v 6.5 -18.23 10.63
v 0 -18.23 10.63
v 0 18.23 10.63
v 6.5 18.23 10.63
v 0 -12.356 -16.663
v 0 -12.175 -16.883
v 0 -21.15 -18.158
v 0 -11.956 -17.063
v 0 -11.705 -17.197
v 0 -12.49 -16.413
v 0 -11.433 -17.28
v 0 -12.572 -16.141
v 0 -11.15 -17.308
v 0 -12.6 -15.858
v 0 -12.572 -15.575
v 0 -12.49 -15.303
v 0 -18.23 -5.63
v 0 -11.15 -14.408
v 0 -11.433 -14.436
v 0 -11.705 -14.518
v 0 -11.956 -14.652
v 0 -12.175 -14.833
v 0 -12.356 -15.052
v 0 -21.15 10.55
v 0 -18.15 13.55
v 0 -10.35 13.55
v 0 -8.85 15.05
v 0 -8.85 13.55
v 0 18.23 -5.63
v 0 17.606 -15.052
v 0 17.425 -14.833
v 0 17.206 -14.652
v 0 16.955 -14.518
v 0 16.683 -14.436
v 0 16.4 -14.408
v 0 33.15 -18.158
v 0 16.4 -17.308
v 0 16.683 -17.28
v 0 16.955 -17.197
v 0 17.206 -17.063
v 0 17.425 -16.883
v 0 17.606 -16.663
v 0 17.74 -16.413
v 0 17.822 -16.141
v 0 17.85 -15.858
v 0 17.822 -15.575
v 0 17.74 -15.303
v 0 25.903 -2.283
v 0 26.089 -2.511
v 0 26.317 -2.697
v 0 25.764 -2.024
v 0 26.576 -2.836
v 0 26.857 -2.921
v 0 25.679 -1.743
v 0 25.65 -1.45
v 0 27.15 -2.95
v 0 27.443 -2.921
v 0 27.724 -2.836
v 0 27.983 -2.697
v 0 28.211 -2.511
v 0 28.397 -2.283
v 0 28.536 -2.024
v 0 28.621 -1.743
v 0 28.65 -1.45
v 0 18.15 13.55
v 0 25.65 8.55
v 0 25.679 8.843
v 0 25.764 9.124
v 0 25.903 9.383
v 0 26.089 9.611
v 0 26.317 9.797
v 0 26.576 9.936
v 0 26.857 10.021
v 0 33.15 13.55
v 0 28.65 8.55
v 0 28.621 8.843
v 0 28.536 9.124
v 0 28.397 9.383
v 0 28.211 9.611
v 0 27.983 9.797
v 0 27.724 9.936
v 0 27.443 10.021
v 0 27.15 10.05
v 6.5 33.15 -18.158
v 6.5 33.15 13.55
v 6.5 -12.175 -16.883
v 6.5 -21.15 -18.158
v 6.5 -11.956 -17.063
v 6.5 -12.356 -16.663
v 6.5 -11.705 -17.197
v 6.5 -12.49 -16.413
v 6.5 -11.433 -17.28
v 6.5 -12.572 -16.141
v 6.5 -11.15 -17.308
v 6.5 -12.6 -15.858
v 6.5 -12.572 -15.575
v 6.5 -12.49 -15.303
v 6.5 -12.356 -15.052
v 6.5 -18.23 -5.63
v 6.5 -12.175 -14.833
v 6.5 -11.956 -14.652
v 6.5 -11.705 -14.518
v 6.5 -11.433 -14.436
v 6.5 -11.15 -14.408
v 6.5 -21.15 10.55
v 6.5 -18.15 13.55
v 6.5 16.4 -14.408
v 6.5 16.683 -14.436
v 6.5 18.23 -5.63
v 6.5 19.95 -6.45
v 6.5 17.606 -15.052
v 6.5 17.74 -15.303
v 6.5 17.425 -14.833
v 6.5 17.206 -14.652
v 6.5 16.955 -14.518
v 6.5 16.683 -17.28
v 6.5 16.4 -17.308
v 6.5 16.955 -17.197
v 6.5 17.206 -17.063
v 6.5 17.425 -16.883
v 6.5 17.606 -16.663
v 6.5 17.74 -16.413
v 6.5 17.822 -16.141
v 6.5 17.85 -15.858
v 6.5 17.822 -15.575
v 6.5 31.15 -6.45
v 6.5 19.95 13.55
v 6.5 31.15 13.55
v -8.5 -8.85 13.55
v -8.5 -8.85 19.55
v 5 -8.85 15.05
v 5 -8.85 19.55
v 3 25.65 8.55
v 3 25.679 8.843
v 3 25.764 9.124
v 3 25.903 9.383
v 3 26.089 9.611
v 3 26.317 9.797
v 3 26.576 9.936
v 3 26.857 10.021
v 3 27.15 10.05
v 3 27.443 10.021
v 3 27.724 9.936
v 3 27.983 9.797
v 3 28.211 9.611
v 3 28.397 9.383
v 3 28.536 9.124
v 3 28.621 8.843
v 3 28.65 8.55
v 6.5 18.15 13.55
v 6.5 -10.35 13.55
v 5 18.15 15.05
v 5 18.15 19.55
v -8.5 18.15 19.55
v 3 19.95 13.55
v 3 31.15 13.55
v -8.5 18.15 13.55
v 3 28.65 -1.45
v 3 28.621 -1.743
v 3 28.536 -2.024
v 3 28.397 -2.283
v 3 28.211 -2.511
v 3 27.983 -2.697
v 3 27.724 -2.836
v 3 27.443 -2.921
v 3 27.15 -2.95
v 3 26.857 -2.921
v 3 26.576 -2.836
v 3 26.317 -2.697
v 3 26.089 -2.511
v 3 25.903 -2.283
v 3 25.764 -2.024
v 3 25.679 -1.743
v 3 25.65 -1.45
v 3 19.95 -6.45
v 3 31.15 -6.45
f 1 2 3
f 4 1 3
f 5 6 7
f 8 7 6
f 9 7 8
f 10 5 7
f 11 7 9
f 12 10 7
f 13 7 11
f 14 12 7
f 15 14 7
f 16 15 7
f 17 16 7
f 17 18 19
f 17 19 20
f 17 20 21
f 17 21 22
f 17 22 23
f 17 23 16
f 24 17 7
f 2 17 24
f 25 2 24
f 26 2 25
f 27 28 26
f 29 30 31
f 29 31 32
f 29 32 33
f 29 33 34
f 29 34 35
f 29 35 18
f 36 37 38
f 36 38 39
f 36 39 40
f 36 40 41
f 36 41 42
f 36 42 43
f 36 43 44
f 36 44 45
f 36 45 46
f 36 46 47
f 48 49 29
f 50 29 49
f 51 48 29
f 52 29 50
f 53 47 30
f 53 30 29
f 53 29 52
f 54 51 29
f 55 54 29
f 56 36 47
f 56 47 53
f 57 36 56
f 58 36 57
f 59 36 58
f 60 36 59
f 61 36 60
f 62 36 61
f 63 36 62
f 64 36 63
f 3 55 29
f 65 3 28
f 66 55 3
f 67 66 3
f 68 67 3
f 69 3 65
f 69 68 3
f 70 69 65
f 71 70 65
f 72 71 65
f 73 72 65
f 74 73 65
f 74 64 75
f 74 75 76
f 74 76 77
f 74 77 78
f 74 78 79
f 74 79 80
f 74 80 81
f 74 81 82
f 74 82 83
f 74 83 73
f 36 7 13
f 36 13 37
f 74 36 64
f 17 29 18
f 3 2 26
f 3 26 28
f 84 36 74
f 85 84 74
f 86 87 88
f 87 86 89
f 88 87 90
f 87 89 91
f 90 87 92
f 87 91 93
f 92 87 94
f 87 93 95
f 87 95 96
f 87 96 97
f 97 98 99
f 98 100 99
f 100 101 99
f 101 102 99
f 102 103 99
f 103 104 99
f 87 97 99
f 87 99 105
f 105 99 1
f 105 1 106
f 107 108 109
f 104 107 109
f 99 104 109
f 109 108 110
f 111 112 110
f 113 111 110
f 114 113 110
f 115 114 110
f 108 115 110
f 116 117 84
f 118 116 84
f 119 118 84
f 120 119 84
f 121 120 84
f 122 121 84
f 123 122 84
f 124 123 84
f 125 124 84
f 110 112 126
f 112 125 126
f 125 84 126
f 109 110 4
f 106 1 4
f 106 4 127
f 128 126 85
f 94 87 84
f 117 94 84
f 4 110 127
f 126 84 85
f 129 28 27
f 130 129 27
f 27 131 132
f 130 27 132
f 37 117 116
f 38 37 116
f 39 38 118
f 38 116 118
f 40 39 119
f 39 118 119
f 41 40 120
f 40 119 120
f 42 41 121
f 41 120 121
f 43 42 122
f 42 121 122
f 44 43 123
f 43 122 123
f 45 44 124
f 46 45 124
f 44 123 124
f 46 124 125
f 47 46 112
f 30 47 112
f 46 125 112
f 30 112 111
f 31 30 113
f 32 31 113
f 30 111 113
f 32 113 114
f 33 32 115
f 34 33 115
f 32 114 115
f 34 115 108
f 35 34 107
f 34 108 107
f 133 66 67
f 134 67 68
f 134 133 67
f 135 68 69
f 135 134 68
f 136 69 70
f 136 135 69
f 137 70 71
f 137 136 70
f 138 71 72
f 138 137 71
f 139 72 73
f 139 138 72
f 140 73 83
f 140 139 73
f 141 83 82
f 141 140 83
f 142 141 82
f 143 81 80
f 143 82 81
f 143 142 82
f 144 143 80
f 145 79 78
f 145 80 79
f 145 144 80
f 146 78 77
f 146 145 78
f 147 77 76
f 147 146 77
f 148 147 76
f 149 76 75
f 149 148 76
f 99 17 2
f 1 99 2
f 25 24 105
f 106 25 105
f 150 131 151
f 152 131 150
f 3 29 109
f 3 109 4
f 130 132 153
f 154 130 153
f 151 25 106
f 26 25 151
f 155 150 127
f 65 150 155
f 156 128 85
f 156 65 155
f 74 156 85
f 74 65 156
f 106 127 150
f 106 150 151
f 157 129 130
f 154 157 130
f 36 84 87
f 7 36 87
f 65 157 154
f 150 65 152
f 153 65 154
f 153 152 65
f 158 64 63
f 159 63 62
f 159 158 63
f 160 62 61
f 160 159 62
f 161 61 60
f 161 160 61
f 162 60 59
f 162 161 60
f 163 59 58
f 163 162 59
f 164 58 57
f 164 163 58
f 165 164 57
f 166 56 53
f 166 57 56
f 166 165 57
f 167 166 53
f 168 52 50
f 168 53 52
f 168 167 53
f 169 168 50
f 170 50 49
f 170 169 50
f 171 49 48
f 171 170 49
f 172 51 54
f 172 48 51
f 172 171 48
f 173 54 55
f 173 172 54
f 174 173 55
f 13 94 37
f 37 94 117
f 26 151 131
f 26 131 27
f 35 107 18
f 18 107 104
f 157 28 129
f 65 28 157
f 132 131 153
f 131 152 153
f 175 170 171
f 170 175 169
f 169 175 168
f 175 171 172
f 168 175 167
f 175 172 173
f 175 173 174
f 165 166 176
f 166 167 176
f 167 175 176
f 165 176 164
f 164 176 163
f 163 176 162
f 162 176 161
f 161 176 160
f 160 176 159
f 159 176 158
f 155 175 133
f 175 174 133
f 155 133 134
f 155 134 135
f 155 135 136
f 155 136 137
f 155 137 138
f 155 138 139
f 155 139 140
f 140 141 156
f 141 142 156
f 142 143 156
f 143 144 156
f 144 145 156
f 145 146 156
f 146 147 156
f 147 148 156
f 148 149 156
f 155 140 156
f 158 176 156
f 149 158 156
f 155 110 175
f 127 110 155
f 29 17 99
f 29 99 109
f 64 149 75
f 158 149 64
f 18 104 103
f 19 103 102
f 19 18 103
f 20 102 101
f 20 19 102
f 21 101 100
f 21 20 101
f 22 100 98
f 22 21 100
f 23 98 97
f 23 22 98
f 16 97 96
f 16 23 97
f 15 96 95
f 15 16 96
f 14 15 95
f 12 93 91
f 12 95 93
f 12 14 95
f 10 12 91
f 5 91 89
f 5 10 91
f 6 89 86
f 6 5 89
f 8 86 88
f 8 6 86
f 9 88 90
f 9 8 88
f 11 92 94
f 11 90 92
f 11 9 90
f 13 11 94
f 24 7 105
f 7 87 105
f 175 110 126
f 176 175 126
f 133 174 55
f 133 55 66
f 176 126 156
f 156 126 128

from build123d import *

# Parameters (mm, degrees)
SKETCH_1_W               = 27.1
SKETCH_1_H               = 42.3
SKETCH_1_W_2             = 21.1
SKETCH_1_H_2             = 36.3
EXTRUDE_1_DEPTH          = 6.5
CHAMFER_1_SIZE           = 3
EXTRUDE_2_DEPTH          = 8.7
EXTRUDE_2_DEPTH_BACK     = 6.5
SKETCH_2_W               = 5
SKETCH_2_H               = 24.3
SKETCH_2_R               = 1.475
SKETCH_3_W               = 27.1
SKETCH_3_H               = 15
EXTRUDE_3_DEPTH          = 6.5
SKETCH_4_W               = 17.60784849
SKETCH_4_H               = 15
EXTRUDE_4_DEPTH          = 6.5
SKETCH_5_W               = 20
SKETCH_5_H               = 11
SKETCH_5_W_2             = 5
SKETCH_5_H_2             = 36.3
EXTRUDE_5_DEPTH          = 6.5
CUT_EXTRUDE_5_DEPTH      = 47.31872216
CUT_EXTRUDE_5_DEPTH_BACK = 47.31872216
SKETCH_6_W               = 20
SKETCH_6_H               = 11.2
CUT_EXTRUDE_6_DEPTH      = 48.966384297
CUT_EXTRUDE_6_DEPTH_BACK = 48.966384297
SKETCH_9_W               = 5
SKETCH_9_H               = 24.3
SKETCH_10_W              = 20
SKETCH_10_H              = 11.2
EXTRUDE_6_DEPTH          = 3
CUT_EXTRUDE_7_DEPTH      = 46.956327339
CUT_EXTRUDE_7_DEPTH_BACK = 46.956327339
SKETCH_11_W              = 13
SKETCH_11_H              = 15
EXTRUDE_7_DEPTH          = 8.5
EXTRUDE_7_DEPTH_BACK     = 5
SKETCH_13_W              = 6
SKETCH_13_H              = 27
CHAMFER_2_SIZE           = 1.5
SKETCH_14_W              = 16.26
SKETCH_14_H              = 36.46
SKETCH_14_W_2            = 16.1
SKETCH_14_H_2            = 36.3
CUT_EXTRUDE_8_DEPTH      = 40.412878606
SKETCH_15_W              = 7.60784849
SKETCH_15_H              = 39.3
EXTRUDE_8_DEPTH          = 6
CUT_EXTRUDE_9_DEPTH      = 6
EXTRUDE_9_DEPTH          = 0.5
CUT_EXTRUDE_10_DEPTH     = 40.412878606
CUT_EXTRUDE_11_DEPTH     = 10


with BuildPart() as part:
    # 草图1 → 凸台-拉伸1 (new body)
    with BuildSketch(Plane(origin=(0, 0, 0), x_dir=(0, 0, -1), z_dir=(1, 0, 0))):
        Rectangle(SKETCH_1_W, SKETCH_1_H)
        Rectangle(SKETCH_1_W_2, SKETCH_1_H_2, mode=Mode.SUBTRACT)
    extrude(amount=EXTRUDE_1_DEPTH)

    # 倒角1
    chamfer_1_edges = [part.edges().sort_by_distance(p)[0] for p in [
        (3.25, 21.15, 13.55),
        (3.25, 21.15, -13.55),
        (3.25, -21.15, -13.55),
        (3.25, -21.15, 13.55),
    ]]
    chamfer(chamfer_1_edges, length=CHAMFER_1_SIZE)

    # 草图2 → 凸台-拉伸2 (add, two sides: drawn at the far end of the back side and taken through both)
    with BuildSketch(Plane.ZY.offset(-EXTRUDE_2_DEPTH_BACK)):
        with Locations((16.05, 0)):
            Rectangle(SKETCH_2_W, SKETCH_2_H)
        with Locations((16.05, 7.15)):
            Circle(SKETCH_2_R, mode=Mode.SUBTRACT)
        with Locations((16.05, -7.15)):
            Circle(SKETCH_2_R, mode=Mode.SUBTRACT)
    extrude(amount=EXTRUDE_2_DEPTH + EXTRUDE_2_DEPTH_BACK)

    # 草图3 → 凸台-拉伸3 (add)
    with BuildSketch(Plane(origin=(6.5, 0, 0), x_dir=(0, 0, -1), z_dir=(1, 0, 0))):
        with Locations((0, 25.65)):
            Rectangle(SKETCH_3_W, SKETCH_3_H)
    extrude(amount=-EXTRUDE_3_DEPTH)

    # 草图4 → 凸台-拉伸4 (add)
    with BuildSketch(Plane.ZY):
        with Locations((-22.353924245, 25.65)):
            Rectangle(SKETCH_4_W, SKETCH_4_H)
    extrude(amount=-EXTRUDE_4_DEPTH)

    # 草图5 → 凸台-拉伸5 (add)
    with BuildSketch(Plane.ZY):
        with Locations((3.55, 25.714062057)):
            Rectangle(SKETCH_5_W, SKETCH_5_H)
        with Locations((-8.05, 0)):
            Rectangle(SKETCH_5_W_2, SKETCH_5_H_2)
    extrude(amount=-EXTRUDE_5_DEPTH)

    # 草图6 → 切除-拉伸5 (cut, two sides: drawn at the far end of the back side and taken through both)
    with BuildSketch(Plane.ZY.offset(-CUT_EXTRUDE_5_DEPTH_BACK)):
        with Locations((3.55, 25.55)):
            Rectangle(SKETCH_6_W, SKETCH_6_H)
    extrude(amount=CUT_EXTRUDE_5_DEPTH + CUT_EXTRUDE_5_DEPTH_BACK, mode=Mode.SUBTRACT)

    # 草图9 → 切除-拉伸6 (cut, two sides: drawn at the far end of the back side and taken through both)
    with BuildSketch(Plane.ZY.offset(8.7).offset(-CUT_EXTRUDE_6_DEPTH_BACK)):
        with Locations((16.05, 0)):
            Rectangle(SKETCH_9_W, SKETCH_9_H)
    extrude(amount=CUT_EXTRUDE_6_DEPTH + CUT_EXTRUDE_6_DEPTH_BACK, mode=Mode.SUBTRACT)

    # 草图10 → 凸台-拉伸6 (add)
    with BuildSketch(Plane.ZY):
        with Locations((3.55, 25.55)):
            Rectangle(SKETCH_10_W, SKETCH_10_H)
    extrude(amount=-EXTRUDE_6_DEPTH)

    # 草图11 → 切除-拉伸7 (cut, two sides: drawn at the far end of the back side and taken through both)
    with BuildSketch(Plane(origin=(6.5, 0, 0), x_dir=(0, 0, -1), z_dir=(1, 0, 0)).offset(-CUT_EXTRUDE_7_DEPTH_BACK)):
        with Locations((24.65784849, 25.65)):
            Rectangle(SKETCH_11_W, SKETCH_11_H)
    extrude(amount=CUT_EXTRUDE_7_DEPTH + CUT_EXTRUDE_7_DEPTH_BACK, mode=Mode.SUBTRACT)

    # 草图13 → 凸台-拉伸7 (add, two sides: drawn at the far end of the back side and taken through both)
    with BuildSketch(Plane.ZY.offset(-EXTRUDE_7_DEPTH_BACK)):
        with Locations((16.55, 4.65)):
            Rectangle(SKETCH_13_W, SKETCH_13_H)
    extrude(amount=EXTRUDE_7_DEPTH + EXTRUDE_7_DEPTH_BACK)

    # 倒角2
    chamfer_2_edges = [part.edges().sort_by_distance(p)[0] for p in [
        (5, 4.65, 13.55),
        (2.5, -8.85, 13.55),
    ]]
    chamfer(chamfer_2_edges, length=CHAMFER_2_SIZE - 0.0001)  # a hair under: the kernel refuses the full size

    # 草图14 → 切除-拉伸8 (cut, through all)
    with BuildSketch(Plane.ZY):
        with Locations((2.5, 0)):
            Rectangle(SKETCH_14_W, SKETCH_14_H)
        with Locations((2.5, 0)):
            Rectangle(SKETCH_14_W_2, SKETCH_14_H_2, mode=Mode.SUBTRACT)
    extrude(amount=-CUT_EXTRUDE_8_DEPTH, mode=Mode.SUBTRACT)

    # 草图15 → 凸台-拉伸8 (add)
    with BuildSketch(Plane(origin=(6.5, 0, 0), x_dir=(0, 0, -1), z_dir=(1, 0, 0))):
        with Locations((14.353924245, -1.5)):
            Rectangle(SKETCH_15_W, SKETCH_15_H)
    extrude(amount=-EXTRUDE_8_DEPTH)

    # 草图16 → 切除-拉伸9 (cut)
    with BuildSketch(Plane(origin=(3, 0, 0), x_dir=(0, 0, -1), z_dir=(1, 0, 0))):
        with BuildLine():
            Line((-8.55, 28.65), (1.45, 28.65))
            ThreePointArc((1.45, 28.65), (2.95, 27.15), (1.45, 25.65))
            Line((1.45, 25.65), (-8.55, 25.65))
            ThreePointArc((-8.55, 25.65), (-10.05, 27.15), (-8.55, 28.65))
        make_face()
    extrude(amount=-CUT_EXTRUDE_9_DEPTH, mode=Mode.SUBTRACT)

    # 草图17 → 凸台-拉伸9 (add)
    with BuildSketch(Plane.ZY.offset(-0.5)):
        Polygon((-13.55, -18.15), (-13.55, 18.15), (-18.15784849, 18.15), (-18.15784849, -21.15), (-10.55, -21.15), align=None)
    extrude(amount=EXTRUDE_9_DEPTH)

    # 草图18 → 切除-拉伸10 (cut, through all)
    with BuildSketch(Plane.ZY):
        with BuildLine():
            Line((-14.40784849, 11.85), (-14.40784849, -11.15))
            ThreePointArc((-14.40784849, -11.15), (-15.85784849, -12.6), (-17.30784849, -11.15))
            Line((-17.30784849, -11.15), (-17.30784849, 11.85))
            ThreePointArc((-17.30784849, 11.85), (-15.85784849, 13.3), (-14.40784849, 11.85))
        make_face()
    extrude(amount=-CUT_EXTRUDE_10_DEPTH, mode=Mode.SUBTRACT)

    # 草图19 → 切除-拉伸11 (cut)
    with BuildSketch(Plane(origin=(6.5, 0, 0), x_dir=(0, 0, -1), z_dir=(1, 0, 0))):
        with BuildLine():
            Line((14.40784849, 11.85), (17.30784849, 11.85))
            Line((17.30784849, 11.85), (17.30784849, 16.4))
            ThreePointArc((17.30784849, 16.4), (15.85784849, 17.85), (14.40784849, 16.4))
            Line((14.40784849, 16.4), (14.40784849, 11.85))
        make_face()
    extrude(amount=-CUT_EXTRUDE_11_DEPTH, mode=Mode.SUBTRACT)


solid = part.part
